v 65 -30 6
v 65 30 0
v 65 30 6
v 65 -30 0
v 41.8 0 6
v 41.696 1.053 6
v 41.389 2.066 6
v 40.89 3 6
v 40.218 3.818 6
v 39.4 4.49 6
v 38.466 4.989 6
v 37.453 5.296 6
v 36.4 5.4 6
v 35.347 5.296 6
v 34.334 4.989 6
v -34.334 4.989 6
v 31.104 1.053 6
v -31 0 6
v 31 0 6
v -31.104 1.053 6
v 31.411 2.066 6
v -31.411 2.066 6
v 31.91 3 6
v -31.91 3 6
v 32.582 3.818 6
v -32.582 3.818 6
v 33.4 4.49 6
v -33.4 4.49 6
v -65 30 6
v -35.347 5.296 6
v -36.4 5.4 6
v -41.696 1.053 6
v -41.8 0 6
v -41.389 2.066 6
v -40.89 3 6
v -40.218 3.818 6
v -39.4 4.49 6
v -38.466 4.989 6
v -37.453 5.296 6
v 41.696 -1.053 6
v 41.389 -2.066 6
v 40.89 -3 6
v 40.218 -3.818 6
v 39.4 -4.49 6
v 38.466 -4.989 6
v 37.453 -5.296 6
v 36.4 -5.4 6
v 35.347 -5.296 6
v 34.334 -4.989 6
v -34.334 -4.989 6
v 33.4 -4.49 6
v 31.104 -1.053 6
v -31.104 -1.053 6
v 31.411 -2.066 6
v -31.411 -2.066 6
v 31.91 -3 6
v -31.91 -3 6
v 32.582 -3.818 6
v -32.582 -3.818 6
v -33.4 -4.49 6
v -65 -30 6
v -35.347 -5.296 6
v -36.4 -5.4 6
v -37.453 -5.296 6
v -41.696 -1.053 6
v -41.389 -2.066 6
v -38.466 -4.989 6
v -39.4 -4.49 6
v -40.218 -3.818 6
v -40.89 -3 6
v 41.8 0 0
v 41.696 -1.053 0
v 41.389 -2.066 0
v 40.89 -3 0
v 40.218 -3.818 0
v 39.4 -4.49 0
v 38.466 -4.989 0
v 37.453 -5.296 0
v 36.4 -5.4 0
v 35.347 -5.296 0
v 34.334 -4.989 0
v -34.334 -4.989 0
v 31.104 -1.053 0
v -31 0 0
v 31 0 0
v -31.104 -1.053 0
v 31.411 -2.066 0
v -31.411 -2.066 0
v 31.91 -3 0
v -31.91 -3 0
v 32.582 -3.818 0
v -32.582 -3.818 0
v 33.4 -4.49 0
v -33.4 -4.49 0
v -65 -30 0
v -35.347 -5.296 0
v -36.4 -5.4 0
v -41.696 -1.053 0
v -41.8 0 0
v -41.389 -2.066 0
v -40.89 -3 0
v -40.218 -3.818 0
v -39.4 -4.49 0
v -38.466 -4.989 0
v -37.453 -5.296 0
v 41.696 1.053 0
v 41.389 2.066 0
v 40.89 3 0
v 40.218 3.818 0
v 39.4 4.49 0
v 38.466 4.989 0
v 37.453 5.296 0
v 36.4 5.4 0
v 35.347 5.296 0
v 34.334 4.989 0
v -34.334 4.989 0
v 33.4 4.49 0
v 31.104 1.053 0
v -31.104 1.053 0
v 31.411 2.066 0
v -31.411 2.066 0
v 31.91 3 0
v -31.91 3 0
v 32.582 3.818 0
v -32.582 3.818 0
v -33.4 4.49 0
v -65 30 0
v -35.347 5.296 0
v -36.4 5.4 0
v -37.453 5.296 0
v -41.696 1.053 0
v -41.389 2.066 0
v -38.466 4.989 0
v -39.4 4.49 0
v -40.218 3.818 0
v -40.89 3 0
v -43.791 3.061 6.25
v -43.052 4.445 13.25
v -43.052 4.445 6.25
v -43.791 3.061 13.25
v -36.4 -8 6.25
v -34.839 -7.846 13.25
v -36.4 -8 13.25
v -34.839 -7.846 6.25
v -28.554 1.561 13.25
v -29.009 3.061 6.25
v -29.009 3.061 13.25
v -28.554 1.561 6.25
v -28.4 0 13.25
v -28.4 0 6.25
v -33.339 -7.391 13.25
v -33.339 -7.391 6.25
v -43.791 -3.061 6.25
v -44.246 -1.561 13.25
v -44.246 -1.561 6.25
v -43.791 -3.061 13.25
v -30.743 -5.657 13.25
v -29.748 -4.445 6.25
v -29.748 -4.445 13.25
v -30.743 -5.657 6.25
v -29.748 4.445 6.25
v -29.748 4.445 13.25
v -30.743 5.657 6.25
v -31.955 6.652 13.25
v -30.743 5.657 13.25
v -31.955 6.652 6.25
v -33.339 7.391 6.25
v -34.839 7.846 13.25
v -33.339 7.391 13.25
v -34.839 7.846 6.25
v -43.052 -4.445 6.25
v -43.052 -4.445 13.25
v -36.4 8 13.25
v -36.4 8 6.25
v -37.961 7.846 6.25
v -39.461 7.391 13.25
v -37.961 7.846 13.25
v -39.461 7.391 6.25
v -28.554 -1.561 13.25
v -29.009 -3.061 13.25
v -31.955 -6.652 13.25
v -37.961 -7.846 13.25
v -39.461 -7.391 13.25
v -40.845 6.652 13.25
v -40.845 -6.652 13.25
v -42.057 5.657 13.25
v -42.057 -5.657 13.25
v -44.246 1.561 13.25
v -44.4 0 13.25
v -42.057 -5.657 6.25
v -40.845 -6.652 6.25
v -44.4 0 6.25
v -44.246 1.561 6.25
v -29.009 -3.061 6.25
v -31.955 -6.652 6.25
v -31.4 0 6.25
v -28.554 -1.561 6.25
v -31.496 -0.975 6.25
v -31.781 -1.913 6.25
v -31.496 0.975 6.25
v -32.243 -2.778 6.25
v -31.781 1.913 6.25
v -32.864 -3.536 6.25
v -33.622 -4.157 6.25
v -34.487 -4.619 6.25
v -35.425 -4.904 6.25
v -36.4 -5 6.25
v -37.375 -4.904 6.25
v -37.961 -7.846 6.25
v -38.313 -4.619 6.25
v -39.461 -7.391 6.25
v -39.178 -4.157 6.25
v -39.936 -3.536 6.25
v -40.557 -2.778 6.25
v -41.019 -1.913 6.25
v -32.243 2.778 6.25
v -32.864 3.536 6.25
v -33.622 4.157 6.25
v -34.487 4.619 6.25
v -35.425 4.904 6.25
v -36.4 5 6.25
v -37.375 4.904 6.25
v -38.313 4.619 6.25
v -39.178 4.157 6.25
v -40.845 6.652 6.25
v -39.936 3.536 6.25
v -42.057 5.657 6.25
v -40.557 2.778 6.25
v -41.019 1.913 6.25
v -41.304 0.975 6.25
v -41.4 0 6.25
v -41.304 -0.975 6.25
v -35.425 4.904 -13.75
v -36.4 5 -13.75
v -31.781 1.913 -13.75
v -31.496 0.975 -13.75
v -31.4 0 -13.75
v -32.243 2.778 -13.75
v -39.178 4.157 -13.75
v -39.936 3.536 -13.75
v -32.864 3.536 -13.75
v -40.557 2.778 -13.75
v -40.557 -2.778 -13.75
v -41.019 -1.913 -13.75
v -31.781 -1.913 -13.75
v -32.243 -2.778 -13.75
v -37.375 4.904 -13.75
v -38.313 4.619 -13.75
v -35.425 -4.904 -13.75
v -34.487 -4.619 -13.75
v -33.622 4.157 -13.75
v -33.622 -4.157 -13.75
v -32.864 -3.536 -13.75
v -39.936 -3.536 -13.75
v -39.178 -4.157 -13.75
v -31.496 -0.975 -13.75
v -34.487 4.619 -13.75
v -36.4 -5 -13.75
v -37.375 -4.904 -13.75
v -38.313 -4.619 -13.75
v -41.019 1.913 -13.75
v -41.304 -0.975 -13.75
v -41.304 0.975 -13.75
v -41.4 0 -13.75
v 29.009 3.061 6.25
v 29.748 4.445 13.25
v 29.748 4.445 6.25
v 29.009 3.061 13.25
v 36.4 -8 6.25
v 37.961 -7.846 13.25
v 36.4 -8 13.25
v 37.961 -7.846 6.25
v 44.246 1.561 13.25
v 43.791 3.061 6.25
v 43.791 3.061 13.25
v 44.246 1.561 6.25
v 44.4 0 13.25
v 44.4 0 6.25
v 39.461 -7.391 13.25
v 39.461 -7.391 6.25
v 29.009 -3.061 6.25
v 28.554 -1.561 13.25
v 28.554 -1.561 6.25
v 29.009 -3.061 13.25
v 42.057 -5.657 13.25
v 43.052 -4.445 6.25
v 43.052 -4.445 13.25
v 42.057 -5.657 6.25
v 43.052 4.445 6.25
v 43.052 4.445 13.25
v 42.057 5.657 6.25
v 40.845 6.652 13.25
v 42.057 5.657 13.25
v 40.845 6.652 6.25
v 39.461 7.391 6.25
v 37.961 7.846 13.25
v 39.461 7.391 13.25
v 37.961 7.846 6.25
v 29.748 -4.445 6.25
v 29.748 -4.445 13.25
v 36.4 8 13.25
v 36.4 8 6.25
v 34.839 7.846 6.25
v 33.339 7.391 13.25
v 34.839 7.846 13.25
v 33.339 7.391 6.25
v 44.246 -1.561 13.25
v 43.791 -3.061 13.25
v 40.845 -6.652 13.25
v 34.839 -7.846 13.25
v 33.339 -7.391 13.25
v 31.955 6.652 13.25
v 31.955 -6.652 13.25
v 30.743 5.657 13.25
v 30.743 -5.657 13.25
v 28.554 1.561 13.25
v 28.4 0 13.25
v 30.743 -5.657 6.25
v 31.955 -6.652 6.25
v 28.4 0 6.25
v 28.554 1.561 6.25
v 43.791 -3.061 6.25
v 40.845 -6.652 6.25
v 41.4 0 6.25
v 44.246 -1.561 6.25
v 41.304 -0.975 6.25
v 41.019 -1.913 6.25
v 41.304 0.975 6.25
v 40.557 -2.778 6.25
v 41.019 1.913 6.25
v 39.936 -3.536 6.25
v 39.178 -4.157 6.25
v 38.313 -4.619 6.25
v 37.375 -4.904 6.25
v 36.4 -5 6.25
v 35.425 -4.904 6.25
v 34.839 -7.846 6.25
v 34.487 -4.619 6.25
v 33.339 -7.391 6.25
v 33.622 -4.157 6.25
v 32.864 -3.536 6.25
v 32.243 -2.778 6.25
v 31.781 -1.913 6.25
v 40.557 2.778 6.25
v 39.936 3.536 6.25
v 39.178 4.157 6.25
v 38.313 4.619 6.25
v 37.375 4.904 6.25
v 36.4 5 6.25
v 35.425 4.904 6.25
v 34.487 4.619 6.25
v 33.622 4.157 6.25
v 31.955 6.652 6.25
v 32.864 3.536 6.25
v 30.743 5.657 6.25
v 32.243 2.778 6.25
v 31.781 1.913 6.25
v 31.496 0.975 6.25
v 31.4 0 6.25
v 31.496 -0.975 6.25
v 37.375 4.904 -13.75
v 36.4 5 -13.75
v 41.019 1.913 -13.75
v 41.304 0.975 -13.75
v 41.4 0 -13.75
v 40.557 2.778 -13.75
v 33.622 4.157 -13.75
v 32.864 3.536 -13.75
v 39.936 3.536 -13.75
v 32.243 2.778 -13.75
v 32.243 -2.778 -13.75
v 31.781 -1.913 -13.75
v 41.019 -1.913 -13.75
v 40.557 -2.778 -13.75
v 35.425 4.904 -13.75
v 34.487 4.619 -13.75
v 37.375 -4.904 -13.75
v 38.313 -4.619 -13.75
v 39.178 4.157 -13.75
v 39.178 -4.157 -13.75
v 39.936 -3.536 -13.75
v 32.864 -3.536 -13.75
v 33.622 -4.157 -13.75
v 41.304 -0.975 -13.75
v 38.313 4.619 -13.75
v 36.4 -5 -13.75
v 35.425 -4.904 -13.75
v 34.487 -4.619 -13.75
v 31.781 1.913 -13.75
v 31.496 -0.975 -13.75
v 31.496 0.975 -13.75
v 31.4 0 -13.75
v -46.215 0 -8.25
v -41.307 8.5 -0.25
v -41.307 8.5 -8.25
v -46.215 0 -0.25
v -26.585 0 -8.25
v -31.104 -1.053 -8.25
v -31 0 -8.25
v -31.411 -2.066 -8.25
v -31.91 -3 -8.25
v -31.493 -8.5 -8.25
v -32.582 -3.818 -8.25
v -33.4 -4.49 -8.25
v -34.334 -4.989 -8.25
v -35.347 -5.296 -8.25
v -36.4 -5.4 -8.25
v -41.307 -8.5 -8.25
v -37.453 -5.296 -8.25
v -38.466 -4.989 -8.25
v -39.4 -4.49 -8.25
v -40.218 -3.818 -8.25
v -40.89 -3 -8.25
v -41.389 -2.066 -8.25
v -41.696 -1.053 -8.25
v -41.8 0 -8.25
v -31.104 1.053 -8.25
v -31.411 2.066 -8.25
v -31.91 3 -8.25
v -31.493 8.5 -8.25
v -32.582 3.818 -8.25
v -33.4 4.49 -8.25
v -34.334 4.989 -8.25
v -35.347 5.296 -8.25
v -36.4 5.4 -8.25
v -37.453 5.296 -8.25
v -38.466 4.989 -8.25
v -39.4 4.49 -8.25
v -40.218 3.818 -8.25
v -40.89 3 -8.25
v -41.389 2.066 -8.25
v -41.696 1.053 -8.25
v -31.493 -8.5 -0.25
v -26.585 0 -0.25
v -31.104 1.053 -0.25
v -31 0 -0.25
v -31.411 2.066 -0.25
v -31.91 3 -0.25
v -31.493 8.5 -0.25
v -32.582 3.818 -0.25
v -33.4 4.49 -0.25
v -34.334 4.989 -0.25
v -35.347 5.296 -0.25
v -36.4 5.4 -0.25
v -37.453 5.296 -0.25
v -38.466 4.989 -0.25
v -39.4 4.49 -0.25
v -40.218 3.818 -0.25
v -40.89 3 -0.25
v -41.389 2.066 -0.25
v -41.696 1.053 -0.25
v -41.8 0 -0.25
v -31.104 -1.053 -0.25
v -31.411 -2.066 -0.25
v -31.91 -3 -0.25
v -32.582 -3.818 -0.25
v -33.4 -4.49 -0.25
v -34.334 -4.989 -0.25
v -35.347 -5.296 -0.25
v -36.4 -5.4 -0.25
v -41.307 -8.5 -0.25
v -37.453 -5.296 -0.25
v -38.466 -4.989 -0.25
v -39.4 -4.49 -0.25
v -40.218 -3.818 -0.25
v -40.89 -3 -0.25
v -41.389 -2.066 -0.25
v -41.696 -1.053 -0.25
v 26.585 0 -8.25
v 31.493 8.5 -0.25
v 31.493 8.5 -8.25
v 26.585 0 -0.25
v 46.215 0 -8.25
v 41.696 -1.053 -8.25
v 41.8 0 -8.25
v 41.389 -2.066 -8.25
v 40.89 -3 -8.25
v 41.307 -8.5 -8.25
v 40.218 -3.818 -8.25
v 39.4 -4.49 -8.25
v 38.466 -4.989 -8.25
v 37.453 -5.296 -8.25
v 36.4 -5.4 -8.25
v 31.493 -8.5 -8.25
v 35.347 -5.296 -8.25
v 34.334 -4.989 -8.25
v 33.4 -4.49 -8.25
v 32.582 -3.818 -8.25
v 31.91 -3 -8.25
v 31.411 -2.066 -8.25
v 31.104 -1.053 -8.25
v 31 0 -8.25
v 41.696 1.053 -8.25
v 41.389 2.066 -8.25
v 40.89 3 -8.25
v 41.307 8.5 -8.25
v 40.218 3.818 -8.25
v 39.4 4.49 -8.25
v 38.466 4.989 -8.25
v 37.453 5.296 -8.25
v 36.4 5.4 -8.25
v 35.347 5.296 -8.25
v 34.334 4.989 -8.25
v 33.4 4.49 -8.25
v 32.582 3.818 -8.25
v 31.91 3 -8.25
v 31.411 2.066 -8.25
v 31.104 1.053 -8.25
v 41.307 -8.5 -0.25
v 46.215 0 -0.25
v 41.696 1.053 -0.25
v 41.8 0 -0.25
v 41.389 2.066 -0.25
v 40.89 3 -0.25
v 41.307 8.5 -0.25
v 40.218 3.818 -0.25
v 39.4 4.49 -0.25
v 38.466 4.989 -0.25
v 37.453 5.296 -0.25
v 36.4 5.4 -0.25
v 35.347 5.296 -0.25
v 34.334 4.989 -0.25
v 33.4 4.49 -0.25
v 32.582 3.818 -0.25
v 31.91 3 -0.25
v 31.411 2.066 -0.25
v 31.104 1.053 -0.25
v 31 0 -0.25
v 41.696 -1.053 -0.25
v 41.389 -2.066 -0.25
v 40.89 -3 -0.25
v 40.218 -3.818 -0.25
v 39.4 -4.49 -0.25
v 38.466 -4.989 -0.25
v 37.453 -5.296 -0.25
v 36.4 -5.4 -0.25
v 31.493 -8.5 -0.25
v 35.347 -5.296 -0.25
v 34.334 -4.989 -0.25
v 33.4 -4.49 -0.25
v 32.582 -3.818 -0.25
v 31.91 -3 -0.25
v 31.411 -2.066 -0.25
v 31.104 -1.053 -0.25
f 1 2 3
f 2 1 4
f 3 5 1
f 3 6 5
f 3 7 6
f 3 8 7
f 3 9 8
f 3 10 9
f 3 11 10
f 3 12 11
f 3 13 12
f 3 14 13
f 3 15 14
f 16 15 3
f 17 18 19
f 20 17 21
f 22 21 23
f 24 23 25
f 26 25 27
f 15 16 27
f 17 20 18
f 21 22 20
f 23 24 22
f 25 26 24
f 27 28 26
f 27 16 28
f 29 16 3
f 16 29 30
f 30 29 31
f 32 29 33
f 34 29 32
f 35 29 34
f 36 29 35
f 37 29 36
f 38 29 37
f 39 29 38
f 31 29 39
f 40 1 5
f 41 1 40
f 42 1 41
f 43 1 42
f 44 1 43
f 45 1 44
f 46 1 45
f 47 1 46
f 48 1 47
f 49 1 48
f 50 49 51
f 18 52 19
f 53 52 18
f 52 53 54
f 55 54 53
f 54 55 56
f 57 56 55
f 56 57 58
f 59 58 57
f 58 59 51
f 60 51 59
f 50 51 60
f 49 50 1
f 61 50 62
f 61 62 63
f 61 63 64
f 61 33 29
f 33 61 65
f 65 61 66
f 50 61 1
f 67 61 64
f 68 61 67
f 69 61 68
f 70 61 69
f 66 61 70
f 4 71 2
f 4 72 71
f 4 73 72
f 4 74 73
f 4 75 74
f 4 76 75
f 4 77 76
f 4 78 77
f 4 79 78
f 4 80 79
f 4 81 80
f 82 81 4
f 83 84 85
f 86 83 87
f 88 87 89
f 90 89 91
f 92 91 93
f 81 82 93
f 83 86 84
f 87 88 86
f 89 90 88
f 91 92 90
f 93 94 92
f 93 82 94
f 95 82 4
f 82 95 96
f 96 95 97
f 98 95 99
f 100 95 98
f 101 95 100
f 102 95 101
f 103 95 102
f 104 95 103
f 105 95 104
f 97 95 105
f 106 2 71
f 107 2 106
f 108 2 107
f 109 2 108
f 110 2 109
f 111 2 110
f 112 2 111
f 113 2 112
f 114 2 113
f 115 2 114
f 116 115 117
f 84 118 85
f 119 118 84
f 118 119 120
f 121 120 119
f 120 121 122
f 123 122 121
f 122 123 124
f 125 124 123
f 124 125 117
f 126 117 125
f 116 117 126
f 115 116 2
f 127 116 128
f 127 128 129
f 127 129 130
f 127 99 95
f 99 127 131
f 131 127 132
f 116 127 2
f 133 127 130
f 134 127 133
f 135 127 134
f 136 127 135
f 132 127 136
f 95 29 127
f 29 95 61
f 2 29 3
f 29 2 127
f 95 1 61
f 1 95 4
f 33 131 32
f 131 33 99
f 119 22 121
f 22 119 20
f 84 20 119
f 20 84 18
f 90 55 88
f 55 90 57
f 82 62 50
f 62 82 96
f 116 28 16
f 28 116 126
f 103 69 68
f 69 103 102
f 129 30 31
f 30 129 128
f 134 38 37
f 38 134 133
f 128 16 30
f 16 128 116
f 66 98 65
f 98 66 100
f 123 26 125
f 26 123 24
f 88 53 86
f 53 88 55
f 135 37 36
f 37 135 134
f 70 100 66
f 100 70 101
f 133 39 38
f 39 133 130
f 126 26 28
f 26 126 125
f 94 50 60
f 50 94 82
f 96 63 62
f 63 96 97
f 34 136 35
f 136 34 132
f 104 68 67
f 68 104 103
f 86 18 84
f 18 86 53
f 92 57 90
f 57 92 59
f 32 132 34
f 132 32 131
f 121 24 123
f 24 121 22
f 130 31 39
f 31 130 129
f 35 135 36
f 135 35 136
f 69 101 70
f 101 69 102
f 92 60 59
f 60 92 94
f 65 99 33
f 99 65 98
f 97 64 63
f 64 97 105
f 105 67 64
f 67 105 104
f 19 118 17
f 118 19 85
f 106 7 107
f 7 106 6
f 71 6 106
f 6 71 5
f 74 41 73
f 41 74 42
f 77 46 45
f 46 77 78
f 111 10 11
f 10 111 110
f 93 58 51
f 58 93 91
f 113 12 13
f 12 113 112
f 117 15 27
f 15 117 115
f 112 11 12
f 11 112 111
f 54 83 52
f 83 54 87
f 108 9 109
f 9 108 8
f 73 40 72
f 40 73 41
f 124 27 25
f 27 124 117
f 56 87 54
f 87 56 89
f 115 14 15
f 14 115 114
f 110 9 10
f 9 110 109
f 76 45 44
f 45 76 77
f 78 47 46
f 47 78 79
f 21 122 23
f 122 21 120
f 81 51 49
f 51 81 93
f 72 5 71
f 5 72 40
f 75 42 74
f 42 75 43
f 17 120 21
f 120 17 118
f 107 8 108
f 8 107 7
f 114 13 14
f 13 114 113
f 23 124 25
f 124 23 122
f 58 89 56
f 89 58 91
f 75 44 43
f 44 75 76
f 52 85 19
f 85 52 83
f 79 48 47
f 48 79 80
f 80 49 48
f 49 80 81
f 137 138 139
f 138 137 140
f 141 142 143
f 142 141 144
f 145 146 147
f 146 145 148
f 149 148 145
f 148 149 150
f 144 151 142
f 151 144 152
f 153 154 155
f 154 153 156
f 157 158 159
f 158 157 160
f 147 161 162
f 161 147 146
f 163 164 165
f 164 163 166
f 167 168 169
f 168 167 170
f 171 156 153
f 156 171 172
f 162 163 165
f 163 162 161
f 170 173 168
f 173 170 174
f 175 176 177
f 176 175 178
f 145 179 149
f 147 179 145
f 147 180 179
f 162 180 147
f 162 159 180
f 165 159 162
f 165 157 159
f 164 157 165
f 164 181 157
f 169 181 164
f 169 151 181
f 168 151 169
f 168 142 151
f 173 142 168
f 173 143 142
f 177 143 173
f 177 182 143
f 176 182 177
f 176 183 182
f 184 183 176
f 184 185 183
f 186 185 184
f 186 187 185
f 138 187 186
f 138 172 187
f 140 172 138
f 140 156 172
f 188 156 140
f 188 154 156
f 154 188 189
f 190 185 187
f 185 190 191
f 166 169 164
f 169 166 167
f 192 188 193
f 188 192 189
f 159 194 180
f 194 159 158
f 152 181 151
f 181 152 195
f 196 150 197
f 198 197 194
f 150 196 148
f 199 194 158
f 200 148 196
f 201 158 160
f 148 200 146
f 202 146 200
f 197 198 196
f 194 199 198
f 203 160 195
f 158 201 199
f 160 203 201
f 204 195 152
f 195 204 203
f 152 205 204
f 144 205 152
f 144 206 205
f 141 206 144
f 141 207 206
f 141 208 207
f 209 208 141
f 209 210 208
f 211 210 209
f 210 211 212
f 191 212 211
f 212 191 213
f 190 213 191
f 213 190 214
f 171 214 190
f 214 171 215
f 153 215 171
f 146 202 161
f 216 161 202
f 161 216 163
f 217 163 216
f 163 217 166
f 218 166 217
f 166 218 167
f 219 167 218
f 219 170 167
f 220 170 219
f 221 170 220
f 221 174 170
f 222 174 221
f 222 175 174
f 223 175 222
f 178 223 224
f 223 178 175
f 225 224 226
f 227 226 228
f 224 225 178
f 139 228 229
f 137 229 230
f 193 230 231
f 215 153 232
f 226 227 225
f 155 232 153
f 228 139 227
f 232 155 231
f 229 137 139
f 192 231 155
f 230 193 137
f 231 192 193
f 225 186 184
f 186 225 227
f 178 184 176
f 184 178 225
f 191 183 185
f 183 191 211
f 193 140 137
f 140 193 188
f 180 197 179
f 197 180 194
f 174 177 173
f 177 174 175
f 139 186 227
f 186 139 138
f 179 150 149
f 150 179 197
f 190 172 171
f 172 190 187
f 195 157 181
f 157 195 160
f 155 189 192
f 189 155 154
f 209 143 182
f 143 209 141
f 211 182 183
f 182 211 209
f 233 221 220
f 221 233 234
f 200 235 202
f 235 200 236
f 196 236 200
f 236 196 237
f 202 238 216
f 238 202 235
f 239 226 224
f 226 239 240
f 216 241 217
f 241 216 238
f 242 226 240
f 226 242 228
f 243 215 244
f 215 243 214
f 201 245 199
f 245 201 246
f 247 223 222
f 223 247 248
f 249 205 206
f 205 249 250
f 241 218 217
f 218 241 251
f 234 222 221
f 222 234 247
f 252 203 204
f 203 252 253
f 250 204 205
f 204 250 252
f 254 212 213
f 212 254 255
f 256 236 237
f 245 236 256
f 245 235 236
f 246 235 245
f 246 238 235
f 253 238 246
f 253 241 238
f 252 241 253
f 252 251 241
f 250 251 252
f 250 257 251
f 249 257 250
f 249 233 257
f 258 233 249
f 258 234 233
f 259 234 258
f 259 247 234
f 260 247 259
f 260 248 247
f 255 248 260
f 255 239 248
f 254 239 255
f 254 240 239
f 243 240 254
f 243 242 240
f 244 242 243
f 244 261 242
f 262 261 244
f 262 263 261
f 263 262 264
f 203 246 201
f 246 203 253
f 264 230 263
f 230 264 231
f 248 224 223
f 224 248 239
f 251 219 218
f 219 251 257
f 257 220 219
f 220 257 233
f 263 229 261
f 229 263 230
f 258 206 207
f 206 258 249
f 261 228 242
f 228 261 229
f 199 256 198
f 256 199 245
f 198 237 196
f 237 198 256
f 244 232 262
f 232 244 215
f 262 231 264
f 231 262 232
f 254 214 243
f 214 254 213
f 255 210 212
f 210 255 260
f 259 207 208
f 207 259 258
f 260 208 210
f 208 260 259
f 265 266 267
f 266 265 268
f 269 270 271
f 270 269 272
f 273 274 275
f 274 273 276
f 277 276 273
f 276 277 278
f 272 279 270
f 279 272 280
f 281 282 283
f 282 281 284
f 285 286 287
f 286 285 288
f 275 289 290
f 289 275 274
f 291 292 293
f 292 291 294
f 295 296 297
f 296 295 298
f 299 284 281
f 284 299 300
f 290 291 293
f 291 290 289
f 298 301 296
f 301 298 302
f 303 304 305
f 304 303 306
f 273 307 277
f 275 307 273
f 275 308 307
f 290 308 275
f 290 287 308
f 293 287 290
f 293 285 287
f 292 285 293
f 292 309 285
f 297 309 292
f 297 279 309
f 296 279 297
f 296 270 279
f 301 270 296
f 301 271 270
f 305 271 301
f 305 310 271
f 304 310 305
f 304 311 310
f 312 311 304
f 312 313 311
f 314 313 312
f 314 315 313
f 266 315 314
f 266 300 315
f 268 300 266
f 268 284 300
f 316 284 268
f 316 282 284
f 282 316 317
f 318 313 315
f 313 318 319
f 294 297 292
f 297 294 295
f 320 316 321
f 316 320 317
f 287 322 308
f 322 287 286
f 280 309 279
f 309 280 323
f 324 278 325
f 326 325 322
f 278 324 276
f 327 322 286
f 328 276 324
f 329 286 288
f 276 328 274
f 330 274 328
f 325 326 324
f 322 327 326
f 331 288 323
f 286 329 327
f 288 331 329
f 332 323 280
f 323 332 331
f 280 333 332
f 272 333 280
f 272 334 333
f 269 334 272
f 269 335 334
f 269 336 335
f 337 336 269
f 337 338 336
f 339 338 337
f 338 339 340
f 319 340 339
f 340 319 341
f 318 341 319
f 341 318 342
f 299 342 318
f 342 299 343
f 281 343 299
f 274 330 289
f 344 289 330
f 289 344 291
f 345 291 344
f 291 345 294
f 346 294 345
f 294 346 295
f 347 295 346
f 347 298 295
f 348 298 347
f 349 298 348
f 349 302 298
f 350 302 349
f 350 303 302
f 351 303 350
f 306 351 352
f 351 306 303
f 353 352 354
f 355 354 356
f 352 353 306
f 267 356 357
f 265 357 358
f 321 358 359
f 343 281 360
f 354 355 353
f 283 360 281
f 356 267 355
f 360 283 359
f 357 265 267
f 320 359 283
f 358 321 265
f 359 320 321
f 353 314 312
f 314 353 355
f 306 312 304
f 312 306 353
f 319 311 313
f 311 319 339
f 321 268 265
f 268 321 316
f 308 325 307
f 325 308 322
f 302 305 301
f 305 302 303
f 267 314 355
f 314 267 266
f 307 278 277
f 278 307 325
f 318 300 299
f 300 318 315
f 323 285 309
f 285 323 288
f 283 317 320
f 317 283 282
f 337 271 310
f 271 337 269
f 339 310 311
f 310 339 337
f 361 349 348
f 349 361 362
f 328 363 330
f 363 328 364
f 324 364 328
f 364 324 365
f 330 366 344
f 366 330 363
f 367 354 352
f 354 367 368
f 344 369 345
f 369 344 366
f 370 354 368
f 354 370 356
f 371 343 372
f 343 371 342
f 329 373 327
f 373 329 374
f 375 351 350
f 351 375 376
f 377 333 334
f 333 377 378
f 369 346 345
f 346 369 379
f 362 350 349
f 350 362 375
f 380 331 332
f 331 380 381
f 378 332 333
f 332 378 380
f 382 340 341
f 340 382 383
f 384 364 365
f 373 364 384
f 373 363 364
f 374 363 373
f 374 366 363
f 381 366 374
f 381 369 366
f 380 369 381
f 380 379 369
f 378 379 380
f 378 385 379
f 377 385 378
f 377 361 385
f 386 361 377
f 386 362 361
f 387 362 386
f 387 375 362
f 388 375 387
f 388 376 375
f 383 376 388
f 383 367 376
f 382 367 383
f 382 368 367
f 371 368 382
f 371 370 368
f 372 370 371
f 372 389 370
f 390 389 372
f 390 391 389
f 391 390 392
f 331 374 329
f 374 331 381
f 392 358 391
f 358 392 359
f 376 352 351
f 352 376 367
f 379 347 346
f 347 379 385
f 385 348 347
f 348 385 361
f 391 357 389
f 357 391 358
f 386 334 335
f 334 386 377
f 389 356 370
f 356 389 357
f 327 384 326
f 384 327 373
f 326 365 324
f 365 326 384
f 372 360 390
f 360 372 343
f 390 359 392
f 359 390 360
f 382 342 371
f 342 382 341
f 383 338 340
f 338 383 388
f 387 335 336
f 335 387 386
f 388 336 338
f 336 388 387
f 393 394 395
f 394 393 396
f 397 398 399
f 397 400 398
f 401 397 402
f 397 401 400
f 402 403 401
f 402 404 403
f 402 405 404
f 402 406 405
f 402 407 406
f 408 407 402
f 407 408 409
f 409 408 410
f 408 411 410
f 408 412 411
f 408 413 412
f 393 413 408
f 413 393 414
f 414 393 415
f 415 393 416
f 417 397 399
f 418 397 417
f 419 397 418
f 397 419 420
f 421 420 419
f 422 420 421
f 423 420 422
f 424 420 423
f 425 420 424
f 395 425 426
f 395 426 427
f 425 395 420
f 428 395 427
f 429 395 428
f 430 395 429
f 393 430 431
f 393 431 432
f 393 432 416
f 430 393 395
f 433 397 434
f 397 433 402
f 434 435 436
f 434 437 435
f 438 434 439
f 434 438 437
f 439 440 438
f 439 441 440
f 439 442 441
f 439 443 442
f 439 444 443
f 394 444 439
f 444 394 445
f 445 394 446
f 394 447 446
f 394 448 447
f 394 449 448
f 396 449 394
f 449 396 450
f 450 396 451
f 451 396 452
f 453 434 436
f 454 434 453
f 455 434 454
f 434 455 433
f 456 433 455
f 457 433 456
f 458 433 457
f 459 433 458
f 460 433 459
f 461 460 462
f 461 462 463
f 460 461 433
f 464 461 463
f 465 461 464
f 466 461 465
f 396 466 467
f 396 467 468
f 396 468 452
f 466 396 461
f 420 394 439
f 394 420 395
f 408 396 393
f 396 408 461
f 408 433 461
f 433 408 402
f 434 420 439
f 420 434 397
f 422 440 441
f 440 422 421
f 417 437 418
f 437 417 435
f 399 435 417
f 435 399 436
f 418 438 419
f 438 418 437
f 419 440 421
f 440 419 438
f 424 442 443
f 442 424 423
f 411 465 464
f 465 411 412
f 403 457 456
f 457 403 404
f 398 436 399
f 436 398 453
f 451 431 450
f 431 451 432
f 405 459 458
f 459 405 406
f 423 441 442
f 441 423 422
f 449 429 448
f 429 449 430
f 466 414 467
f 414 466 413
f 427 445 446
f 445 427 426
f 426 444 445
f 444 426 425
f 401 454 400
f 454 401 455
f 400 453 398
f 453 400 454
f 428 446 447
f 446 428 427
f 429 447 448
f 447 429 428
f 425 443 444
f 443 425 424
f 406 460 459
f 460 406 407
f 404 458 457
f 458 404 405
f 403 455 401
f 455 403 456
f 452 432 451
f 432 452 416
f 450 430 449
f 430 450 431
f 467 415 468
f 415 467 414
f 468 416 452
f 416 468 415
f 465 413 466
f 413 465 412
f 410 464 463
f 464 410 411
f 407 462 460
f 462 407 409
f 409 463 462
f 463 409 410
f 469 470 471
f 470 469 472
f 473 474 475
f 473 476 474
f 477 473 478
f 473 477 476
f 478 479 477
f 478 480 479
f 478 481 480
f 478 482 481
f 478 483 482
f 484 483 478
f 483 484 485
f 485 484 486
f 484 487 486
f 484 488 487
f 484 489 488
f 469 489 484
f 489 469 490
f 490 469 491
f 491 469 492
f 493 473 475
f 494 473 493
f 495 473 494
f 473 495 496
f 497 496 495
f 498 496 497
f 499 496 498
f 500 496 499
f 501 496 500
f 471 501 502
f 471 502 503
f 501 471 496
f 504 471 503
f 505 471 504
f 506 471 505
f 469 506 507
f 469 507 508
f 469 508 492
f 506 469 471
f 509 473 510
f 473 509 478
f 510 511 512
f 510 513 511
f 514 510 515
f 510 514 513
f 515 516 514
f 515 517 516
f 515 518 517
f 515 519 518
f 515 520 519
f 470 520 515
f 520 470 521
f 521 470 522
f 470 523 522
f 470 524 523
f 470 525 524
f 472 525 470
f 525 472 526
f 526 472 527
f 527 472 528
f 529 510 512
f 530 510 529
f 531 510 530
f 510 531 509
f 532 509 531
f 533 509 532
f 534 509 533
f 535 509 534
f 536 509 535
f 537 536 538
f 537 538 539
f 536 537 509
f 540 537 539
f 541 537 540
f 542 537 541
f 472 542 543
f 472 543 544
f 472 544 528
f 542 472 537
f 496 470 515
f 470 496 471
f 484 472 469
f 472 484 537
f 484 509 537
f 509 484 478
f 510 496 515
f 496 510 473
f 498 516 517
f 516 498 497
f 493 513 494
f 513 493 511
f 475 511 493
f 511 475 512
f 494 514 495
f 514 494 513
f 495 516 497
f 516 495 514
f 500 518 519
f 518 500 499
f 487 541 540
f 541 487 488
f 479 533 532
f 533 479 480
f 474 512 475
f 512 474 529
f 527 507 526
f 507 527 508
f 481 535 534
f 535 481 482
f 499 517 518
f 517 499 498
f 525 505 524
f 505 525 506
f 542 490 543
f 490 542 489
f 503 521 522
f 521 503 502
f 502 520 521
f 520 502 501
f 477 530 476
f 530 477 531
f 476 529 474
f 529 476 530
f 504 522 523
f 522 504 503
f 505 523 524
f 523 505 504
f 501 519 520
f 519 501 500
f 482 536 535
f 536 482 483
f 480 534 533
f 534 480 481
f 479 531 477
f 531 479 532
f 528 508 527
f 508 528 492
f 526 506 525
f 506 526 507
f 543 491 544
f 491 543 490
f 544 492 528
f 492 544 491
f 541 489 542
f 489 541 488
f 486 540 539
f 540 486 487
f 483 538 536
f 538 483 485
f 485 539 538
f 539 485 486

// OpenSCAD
$fn = 32;

// ------------------------------------------------------------------------
// Bolted plate: 130 x 60 x 6 mm plate, 2 fasteners
// Every part is its own module, assembly() places them once.
// ------------------------------------------------------------------------

// --- part 1 ---
module plate() {
  difference() {
    translate([-65, -30, 0]) cube([130, 60, 6]);
    translate([-36.4, 0, -1]) cylinder(h = 8, d = 10.8);
    translate([36.4, 0, -1]) cylinder(h = 8, d = 10.8);
  }
}

// --- part 2 ---
module bolt1() {
  cylinder(h = 7, d = 16);
  translate([0, 0, -20]) cylinder(h = 20, d = 10);
}

// --- part 3 ---
module bolt2() {
  cylinder(h = 7, d = 16);
  translate([0, 0, -20]) cylinder(h = 20, d = 10);
}

// --- part 4 ---
module nut1() {
  difference() {
    linear_extrude(height = 8) polygon(points = [[9.815, 0], [4.907, 8.5], [-4.907, 8.5], [-9.815, 0], [-4.907, -8.5], [4.907, -8.5]]);
    translate([0, 0, -1]) cylinder(h = 10, d = 10.8);
  }
}

// --- part 5 ---
module nut2() {
  difference() {
    linear_extrude(height = 8) polygon(points = [[9.815, 0], [4.907, 8.5], [-4.907, 8.5], [-9.815, 0], [-4.907, -8.5], [4.907, -8.5]]);
    translate([0, 0, -1]) cylinder(h = 10, d = 10.8);
  }
}

// --- assembly ---
module assembly() {
  translate([0, 0, 0]) rotate([0, 0, 0]) plate();
  translate([-36.4, 0, 6.25]) rotate([0, 0, 0]) bolt1();
  translate([36.4, 0, 6.25]) rotate([0, 0, 0]) bolt2();
  translate([-36.4, 0, -8.25]) rotate([0, 0, 0]) nut1();
  translate([36.4, 0, -8.25]) rotate([0, 0, 0]) nut2();
}

assembly();
